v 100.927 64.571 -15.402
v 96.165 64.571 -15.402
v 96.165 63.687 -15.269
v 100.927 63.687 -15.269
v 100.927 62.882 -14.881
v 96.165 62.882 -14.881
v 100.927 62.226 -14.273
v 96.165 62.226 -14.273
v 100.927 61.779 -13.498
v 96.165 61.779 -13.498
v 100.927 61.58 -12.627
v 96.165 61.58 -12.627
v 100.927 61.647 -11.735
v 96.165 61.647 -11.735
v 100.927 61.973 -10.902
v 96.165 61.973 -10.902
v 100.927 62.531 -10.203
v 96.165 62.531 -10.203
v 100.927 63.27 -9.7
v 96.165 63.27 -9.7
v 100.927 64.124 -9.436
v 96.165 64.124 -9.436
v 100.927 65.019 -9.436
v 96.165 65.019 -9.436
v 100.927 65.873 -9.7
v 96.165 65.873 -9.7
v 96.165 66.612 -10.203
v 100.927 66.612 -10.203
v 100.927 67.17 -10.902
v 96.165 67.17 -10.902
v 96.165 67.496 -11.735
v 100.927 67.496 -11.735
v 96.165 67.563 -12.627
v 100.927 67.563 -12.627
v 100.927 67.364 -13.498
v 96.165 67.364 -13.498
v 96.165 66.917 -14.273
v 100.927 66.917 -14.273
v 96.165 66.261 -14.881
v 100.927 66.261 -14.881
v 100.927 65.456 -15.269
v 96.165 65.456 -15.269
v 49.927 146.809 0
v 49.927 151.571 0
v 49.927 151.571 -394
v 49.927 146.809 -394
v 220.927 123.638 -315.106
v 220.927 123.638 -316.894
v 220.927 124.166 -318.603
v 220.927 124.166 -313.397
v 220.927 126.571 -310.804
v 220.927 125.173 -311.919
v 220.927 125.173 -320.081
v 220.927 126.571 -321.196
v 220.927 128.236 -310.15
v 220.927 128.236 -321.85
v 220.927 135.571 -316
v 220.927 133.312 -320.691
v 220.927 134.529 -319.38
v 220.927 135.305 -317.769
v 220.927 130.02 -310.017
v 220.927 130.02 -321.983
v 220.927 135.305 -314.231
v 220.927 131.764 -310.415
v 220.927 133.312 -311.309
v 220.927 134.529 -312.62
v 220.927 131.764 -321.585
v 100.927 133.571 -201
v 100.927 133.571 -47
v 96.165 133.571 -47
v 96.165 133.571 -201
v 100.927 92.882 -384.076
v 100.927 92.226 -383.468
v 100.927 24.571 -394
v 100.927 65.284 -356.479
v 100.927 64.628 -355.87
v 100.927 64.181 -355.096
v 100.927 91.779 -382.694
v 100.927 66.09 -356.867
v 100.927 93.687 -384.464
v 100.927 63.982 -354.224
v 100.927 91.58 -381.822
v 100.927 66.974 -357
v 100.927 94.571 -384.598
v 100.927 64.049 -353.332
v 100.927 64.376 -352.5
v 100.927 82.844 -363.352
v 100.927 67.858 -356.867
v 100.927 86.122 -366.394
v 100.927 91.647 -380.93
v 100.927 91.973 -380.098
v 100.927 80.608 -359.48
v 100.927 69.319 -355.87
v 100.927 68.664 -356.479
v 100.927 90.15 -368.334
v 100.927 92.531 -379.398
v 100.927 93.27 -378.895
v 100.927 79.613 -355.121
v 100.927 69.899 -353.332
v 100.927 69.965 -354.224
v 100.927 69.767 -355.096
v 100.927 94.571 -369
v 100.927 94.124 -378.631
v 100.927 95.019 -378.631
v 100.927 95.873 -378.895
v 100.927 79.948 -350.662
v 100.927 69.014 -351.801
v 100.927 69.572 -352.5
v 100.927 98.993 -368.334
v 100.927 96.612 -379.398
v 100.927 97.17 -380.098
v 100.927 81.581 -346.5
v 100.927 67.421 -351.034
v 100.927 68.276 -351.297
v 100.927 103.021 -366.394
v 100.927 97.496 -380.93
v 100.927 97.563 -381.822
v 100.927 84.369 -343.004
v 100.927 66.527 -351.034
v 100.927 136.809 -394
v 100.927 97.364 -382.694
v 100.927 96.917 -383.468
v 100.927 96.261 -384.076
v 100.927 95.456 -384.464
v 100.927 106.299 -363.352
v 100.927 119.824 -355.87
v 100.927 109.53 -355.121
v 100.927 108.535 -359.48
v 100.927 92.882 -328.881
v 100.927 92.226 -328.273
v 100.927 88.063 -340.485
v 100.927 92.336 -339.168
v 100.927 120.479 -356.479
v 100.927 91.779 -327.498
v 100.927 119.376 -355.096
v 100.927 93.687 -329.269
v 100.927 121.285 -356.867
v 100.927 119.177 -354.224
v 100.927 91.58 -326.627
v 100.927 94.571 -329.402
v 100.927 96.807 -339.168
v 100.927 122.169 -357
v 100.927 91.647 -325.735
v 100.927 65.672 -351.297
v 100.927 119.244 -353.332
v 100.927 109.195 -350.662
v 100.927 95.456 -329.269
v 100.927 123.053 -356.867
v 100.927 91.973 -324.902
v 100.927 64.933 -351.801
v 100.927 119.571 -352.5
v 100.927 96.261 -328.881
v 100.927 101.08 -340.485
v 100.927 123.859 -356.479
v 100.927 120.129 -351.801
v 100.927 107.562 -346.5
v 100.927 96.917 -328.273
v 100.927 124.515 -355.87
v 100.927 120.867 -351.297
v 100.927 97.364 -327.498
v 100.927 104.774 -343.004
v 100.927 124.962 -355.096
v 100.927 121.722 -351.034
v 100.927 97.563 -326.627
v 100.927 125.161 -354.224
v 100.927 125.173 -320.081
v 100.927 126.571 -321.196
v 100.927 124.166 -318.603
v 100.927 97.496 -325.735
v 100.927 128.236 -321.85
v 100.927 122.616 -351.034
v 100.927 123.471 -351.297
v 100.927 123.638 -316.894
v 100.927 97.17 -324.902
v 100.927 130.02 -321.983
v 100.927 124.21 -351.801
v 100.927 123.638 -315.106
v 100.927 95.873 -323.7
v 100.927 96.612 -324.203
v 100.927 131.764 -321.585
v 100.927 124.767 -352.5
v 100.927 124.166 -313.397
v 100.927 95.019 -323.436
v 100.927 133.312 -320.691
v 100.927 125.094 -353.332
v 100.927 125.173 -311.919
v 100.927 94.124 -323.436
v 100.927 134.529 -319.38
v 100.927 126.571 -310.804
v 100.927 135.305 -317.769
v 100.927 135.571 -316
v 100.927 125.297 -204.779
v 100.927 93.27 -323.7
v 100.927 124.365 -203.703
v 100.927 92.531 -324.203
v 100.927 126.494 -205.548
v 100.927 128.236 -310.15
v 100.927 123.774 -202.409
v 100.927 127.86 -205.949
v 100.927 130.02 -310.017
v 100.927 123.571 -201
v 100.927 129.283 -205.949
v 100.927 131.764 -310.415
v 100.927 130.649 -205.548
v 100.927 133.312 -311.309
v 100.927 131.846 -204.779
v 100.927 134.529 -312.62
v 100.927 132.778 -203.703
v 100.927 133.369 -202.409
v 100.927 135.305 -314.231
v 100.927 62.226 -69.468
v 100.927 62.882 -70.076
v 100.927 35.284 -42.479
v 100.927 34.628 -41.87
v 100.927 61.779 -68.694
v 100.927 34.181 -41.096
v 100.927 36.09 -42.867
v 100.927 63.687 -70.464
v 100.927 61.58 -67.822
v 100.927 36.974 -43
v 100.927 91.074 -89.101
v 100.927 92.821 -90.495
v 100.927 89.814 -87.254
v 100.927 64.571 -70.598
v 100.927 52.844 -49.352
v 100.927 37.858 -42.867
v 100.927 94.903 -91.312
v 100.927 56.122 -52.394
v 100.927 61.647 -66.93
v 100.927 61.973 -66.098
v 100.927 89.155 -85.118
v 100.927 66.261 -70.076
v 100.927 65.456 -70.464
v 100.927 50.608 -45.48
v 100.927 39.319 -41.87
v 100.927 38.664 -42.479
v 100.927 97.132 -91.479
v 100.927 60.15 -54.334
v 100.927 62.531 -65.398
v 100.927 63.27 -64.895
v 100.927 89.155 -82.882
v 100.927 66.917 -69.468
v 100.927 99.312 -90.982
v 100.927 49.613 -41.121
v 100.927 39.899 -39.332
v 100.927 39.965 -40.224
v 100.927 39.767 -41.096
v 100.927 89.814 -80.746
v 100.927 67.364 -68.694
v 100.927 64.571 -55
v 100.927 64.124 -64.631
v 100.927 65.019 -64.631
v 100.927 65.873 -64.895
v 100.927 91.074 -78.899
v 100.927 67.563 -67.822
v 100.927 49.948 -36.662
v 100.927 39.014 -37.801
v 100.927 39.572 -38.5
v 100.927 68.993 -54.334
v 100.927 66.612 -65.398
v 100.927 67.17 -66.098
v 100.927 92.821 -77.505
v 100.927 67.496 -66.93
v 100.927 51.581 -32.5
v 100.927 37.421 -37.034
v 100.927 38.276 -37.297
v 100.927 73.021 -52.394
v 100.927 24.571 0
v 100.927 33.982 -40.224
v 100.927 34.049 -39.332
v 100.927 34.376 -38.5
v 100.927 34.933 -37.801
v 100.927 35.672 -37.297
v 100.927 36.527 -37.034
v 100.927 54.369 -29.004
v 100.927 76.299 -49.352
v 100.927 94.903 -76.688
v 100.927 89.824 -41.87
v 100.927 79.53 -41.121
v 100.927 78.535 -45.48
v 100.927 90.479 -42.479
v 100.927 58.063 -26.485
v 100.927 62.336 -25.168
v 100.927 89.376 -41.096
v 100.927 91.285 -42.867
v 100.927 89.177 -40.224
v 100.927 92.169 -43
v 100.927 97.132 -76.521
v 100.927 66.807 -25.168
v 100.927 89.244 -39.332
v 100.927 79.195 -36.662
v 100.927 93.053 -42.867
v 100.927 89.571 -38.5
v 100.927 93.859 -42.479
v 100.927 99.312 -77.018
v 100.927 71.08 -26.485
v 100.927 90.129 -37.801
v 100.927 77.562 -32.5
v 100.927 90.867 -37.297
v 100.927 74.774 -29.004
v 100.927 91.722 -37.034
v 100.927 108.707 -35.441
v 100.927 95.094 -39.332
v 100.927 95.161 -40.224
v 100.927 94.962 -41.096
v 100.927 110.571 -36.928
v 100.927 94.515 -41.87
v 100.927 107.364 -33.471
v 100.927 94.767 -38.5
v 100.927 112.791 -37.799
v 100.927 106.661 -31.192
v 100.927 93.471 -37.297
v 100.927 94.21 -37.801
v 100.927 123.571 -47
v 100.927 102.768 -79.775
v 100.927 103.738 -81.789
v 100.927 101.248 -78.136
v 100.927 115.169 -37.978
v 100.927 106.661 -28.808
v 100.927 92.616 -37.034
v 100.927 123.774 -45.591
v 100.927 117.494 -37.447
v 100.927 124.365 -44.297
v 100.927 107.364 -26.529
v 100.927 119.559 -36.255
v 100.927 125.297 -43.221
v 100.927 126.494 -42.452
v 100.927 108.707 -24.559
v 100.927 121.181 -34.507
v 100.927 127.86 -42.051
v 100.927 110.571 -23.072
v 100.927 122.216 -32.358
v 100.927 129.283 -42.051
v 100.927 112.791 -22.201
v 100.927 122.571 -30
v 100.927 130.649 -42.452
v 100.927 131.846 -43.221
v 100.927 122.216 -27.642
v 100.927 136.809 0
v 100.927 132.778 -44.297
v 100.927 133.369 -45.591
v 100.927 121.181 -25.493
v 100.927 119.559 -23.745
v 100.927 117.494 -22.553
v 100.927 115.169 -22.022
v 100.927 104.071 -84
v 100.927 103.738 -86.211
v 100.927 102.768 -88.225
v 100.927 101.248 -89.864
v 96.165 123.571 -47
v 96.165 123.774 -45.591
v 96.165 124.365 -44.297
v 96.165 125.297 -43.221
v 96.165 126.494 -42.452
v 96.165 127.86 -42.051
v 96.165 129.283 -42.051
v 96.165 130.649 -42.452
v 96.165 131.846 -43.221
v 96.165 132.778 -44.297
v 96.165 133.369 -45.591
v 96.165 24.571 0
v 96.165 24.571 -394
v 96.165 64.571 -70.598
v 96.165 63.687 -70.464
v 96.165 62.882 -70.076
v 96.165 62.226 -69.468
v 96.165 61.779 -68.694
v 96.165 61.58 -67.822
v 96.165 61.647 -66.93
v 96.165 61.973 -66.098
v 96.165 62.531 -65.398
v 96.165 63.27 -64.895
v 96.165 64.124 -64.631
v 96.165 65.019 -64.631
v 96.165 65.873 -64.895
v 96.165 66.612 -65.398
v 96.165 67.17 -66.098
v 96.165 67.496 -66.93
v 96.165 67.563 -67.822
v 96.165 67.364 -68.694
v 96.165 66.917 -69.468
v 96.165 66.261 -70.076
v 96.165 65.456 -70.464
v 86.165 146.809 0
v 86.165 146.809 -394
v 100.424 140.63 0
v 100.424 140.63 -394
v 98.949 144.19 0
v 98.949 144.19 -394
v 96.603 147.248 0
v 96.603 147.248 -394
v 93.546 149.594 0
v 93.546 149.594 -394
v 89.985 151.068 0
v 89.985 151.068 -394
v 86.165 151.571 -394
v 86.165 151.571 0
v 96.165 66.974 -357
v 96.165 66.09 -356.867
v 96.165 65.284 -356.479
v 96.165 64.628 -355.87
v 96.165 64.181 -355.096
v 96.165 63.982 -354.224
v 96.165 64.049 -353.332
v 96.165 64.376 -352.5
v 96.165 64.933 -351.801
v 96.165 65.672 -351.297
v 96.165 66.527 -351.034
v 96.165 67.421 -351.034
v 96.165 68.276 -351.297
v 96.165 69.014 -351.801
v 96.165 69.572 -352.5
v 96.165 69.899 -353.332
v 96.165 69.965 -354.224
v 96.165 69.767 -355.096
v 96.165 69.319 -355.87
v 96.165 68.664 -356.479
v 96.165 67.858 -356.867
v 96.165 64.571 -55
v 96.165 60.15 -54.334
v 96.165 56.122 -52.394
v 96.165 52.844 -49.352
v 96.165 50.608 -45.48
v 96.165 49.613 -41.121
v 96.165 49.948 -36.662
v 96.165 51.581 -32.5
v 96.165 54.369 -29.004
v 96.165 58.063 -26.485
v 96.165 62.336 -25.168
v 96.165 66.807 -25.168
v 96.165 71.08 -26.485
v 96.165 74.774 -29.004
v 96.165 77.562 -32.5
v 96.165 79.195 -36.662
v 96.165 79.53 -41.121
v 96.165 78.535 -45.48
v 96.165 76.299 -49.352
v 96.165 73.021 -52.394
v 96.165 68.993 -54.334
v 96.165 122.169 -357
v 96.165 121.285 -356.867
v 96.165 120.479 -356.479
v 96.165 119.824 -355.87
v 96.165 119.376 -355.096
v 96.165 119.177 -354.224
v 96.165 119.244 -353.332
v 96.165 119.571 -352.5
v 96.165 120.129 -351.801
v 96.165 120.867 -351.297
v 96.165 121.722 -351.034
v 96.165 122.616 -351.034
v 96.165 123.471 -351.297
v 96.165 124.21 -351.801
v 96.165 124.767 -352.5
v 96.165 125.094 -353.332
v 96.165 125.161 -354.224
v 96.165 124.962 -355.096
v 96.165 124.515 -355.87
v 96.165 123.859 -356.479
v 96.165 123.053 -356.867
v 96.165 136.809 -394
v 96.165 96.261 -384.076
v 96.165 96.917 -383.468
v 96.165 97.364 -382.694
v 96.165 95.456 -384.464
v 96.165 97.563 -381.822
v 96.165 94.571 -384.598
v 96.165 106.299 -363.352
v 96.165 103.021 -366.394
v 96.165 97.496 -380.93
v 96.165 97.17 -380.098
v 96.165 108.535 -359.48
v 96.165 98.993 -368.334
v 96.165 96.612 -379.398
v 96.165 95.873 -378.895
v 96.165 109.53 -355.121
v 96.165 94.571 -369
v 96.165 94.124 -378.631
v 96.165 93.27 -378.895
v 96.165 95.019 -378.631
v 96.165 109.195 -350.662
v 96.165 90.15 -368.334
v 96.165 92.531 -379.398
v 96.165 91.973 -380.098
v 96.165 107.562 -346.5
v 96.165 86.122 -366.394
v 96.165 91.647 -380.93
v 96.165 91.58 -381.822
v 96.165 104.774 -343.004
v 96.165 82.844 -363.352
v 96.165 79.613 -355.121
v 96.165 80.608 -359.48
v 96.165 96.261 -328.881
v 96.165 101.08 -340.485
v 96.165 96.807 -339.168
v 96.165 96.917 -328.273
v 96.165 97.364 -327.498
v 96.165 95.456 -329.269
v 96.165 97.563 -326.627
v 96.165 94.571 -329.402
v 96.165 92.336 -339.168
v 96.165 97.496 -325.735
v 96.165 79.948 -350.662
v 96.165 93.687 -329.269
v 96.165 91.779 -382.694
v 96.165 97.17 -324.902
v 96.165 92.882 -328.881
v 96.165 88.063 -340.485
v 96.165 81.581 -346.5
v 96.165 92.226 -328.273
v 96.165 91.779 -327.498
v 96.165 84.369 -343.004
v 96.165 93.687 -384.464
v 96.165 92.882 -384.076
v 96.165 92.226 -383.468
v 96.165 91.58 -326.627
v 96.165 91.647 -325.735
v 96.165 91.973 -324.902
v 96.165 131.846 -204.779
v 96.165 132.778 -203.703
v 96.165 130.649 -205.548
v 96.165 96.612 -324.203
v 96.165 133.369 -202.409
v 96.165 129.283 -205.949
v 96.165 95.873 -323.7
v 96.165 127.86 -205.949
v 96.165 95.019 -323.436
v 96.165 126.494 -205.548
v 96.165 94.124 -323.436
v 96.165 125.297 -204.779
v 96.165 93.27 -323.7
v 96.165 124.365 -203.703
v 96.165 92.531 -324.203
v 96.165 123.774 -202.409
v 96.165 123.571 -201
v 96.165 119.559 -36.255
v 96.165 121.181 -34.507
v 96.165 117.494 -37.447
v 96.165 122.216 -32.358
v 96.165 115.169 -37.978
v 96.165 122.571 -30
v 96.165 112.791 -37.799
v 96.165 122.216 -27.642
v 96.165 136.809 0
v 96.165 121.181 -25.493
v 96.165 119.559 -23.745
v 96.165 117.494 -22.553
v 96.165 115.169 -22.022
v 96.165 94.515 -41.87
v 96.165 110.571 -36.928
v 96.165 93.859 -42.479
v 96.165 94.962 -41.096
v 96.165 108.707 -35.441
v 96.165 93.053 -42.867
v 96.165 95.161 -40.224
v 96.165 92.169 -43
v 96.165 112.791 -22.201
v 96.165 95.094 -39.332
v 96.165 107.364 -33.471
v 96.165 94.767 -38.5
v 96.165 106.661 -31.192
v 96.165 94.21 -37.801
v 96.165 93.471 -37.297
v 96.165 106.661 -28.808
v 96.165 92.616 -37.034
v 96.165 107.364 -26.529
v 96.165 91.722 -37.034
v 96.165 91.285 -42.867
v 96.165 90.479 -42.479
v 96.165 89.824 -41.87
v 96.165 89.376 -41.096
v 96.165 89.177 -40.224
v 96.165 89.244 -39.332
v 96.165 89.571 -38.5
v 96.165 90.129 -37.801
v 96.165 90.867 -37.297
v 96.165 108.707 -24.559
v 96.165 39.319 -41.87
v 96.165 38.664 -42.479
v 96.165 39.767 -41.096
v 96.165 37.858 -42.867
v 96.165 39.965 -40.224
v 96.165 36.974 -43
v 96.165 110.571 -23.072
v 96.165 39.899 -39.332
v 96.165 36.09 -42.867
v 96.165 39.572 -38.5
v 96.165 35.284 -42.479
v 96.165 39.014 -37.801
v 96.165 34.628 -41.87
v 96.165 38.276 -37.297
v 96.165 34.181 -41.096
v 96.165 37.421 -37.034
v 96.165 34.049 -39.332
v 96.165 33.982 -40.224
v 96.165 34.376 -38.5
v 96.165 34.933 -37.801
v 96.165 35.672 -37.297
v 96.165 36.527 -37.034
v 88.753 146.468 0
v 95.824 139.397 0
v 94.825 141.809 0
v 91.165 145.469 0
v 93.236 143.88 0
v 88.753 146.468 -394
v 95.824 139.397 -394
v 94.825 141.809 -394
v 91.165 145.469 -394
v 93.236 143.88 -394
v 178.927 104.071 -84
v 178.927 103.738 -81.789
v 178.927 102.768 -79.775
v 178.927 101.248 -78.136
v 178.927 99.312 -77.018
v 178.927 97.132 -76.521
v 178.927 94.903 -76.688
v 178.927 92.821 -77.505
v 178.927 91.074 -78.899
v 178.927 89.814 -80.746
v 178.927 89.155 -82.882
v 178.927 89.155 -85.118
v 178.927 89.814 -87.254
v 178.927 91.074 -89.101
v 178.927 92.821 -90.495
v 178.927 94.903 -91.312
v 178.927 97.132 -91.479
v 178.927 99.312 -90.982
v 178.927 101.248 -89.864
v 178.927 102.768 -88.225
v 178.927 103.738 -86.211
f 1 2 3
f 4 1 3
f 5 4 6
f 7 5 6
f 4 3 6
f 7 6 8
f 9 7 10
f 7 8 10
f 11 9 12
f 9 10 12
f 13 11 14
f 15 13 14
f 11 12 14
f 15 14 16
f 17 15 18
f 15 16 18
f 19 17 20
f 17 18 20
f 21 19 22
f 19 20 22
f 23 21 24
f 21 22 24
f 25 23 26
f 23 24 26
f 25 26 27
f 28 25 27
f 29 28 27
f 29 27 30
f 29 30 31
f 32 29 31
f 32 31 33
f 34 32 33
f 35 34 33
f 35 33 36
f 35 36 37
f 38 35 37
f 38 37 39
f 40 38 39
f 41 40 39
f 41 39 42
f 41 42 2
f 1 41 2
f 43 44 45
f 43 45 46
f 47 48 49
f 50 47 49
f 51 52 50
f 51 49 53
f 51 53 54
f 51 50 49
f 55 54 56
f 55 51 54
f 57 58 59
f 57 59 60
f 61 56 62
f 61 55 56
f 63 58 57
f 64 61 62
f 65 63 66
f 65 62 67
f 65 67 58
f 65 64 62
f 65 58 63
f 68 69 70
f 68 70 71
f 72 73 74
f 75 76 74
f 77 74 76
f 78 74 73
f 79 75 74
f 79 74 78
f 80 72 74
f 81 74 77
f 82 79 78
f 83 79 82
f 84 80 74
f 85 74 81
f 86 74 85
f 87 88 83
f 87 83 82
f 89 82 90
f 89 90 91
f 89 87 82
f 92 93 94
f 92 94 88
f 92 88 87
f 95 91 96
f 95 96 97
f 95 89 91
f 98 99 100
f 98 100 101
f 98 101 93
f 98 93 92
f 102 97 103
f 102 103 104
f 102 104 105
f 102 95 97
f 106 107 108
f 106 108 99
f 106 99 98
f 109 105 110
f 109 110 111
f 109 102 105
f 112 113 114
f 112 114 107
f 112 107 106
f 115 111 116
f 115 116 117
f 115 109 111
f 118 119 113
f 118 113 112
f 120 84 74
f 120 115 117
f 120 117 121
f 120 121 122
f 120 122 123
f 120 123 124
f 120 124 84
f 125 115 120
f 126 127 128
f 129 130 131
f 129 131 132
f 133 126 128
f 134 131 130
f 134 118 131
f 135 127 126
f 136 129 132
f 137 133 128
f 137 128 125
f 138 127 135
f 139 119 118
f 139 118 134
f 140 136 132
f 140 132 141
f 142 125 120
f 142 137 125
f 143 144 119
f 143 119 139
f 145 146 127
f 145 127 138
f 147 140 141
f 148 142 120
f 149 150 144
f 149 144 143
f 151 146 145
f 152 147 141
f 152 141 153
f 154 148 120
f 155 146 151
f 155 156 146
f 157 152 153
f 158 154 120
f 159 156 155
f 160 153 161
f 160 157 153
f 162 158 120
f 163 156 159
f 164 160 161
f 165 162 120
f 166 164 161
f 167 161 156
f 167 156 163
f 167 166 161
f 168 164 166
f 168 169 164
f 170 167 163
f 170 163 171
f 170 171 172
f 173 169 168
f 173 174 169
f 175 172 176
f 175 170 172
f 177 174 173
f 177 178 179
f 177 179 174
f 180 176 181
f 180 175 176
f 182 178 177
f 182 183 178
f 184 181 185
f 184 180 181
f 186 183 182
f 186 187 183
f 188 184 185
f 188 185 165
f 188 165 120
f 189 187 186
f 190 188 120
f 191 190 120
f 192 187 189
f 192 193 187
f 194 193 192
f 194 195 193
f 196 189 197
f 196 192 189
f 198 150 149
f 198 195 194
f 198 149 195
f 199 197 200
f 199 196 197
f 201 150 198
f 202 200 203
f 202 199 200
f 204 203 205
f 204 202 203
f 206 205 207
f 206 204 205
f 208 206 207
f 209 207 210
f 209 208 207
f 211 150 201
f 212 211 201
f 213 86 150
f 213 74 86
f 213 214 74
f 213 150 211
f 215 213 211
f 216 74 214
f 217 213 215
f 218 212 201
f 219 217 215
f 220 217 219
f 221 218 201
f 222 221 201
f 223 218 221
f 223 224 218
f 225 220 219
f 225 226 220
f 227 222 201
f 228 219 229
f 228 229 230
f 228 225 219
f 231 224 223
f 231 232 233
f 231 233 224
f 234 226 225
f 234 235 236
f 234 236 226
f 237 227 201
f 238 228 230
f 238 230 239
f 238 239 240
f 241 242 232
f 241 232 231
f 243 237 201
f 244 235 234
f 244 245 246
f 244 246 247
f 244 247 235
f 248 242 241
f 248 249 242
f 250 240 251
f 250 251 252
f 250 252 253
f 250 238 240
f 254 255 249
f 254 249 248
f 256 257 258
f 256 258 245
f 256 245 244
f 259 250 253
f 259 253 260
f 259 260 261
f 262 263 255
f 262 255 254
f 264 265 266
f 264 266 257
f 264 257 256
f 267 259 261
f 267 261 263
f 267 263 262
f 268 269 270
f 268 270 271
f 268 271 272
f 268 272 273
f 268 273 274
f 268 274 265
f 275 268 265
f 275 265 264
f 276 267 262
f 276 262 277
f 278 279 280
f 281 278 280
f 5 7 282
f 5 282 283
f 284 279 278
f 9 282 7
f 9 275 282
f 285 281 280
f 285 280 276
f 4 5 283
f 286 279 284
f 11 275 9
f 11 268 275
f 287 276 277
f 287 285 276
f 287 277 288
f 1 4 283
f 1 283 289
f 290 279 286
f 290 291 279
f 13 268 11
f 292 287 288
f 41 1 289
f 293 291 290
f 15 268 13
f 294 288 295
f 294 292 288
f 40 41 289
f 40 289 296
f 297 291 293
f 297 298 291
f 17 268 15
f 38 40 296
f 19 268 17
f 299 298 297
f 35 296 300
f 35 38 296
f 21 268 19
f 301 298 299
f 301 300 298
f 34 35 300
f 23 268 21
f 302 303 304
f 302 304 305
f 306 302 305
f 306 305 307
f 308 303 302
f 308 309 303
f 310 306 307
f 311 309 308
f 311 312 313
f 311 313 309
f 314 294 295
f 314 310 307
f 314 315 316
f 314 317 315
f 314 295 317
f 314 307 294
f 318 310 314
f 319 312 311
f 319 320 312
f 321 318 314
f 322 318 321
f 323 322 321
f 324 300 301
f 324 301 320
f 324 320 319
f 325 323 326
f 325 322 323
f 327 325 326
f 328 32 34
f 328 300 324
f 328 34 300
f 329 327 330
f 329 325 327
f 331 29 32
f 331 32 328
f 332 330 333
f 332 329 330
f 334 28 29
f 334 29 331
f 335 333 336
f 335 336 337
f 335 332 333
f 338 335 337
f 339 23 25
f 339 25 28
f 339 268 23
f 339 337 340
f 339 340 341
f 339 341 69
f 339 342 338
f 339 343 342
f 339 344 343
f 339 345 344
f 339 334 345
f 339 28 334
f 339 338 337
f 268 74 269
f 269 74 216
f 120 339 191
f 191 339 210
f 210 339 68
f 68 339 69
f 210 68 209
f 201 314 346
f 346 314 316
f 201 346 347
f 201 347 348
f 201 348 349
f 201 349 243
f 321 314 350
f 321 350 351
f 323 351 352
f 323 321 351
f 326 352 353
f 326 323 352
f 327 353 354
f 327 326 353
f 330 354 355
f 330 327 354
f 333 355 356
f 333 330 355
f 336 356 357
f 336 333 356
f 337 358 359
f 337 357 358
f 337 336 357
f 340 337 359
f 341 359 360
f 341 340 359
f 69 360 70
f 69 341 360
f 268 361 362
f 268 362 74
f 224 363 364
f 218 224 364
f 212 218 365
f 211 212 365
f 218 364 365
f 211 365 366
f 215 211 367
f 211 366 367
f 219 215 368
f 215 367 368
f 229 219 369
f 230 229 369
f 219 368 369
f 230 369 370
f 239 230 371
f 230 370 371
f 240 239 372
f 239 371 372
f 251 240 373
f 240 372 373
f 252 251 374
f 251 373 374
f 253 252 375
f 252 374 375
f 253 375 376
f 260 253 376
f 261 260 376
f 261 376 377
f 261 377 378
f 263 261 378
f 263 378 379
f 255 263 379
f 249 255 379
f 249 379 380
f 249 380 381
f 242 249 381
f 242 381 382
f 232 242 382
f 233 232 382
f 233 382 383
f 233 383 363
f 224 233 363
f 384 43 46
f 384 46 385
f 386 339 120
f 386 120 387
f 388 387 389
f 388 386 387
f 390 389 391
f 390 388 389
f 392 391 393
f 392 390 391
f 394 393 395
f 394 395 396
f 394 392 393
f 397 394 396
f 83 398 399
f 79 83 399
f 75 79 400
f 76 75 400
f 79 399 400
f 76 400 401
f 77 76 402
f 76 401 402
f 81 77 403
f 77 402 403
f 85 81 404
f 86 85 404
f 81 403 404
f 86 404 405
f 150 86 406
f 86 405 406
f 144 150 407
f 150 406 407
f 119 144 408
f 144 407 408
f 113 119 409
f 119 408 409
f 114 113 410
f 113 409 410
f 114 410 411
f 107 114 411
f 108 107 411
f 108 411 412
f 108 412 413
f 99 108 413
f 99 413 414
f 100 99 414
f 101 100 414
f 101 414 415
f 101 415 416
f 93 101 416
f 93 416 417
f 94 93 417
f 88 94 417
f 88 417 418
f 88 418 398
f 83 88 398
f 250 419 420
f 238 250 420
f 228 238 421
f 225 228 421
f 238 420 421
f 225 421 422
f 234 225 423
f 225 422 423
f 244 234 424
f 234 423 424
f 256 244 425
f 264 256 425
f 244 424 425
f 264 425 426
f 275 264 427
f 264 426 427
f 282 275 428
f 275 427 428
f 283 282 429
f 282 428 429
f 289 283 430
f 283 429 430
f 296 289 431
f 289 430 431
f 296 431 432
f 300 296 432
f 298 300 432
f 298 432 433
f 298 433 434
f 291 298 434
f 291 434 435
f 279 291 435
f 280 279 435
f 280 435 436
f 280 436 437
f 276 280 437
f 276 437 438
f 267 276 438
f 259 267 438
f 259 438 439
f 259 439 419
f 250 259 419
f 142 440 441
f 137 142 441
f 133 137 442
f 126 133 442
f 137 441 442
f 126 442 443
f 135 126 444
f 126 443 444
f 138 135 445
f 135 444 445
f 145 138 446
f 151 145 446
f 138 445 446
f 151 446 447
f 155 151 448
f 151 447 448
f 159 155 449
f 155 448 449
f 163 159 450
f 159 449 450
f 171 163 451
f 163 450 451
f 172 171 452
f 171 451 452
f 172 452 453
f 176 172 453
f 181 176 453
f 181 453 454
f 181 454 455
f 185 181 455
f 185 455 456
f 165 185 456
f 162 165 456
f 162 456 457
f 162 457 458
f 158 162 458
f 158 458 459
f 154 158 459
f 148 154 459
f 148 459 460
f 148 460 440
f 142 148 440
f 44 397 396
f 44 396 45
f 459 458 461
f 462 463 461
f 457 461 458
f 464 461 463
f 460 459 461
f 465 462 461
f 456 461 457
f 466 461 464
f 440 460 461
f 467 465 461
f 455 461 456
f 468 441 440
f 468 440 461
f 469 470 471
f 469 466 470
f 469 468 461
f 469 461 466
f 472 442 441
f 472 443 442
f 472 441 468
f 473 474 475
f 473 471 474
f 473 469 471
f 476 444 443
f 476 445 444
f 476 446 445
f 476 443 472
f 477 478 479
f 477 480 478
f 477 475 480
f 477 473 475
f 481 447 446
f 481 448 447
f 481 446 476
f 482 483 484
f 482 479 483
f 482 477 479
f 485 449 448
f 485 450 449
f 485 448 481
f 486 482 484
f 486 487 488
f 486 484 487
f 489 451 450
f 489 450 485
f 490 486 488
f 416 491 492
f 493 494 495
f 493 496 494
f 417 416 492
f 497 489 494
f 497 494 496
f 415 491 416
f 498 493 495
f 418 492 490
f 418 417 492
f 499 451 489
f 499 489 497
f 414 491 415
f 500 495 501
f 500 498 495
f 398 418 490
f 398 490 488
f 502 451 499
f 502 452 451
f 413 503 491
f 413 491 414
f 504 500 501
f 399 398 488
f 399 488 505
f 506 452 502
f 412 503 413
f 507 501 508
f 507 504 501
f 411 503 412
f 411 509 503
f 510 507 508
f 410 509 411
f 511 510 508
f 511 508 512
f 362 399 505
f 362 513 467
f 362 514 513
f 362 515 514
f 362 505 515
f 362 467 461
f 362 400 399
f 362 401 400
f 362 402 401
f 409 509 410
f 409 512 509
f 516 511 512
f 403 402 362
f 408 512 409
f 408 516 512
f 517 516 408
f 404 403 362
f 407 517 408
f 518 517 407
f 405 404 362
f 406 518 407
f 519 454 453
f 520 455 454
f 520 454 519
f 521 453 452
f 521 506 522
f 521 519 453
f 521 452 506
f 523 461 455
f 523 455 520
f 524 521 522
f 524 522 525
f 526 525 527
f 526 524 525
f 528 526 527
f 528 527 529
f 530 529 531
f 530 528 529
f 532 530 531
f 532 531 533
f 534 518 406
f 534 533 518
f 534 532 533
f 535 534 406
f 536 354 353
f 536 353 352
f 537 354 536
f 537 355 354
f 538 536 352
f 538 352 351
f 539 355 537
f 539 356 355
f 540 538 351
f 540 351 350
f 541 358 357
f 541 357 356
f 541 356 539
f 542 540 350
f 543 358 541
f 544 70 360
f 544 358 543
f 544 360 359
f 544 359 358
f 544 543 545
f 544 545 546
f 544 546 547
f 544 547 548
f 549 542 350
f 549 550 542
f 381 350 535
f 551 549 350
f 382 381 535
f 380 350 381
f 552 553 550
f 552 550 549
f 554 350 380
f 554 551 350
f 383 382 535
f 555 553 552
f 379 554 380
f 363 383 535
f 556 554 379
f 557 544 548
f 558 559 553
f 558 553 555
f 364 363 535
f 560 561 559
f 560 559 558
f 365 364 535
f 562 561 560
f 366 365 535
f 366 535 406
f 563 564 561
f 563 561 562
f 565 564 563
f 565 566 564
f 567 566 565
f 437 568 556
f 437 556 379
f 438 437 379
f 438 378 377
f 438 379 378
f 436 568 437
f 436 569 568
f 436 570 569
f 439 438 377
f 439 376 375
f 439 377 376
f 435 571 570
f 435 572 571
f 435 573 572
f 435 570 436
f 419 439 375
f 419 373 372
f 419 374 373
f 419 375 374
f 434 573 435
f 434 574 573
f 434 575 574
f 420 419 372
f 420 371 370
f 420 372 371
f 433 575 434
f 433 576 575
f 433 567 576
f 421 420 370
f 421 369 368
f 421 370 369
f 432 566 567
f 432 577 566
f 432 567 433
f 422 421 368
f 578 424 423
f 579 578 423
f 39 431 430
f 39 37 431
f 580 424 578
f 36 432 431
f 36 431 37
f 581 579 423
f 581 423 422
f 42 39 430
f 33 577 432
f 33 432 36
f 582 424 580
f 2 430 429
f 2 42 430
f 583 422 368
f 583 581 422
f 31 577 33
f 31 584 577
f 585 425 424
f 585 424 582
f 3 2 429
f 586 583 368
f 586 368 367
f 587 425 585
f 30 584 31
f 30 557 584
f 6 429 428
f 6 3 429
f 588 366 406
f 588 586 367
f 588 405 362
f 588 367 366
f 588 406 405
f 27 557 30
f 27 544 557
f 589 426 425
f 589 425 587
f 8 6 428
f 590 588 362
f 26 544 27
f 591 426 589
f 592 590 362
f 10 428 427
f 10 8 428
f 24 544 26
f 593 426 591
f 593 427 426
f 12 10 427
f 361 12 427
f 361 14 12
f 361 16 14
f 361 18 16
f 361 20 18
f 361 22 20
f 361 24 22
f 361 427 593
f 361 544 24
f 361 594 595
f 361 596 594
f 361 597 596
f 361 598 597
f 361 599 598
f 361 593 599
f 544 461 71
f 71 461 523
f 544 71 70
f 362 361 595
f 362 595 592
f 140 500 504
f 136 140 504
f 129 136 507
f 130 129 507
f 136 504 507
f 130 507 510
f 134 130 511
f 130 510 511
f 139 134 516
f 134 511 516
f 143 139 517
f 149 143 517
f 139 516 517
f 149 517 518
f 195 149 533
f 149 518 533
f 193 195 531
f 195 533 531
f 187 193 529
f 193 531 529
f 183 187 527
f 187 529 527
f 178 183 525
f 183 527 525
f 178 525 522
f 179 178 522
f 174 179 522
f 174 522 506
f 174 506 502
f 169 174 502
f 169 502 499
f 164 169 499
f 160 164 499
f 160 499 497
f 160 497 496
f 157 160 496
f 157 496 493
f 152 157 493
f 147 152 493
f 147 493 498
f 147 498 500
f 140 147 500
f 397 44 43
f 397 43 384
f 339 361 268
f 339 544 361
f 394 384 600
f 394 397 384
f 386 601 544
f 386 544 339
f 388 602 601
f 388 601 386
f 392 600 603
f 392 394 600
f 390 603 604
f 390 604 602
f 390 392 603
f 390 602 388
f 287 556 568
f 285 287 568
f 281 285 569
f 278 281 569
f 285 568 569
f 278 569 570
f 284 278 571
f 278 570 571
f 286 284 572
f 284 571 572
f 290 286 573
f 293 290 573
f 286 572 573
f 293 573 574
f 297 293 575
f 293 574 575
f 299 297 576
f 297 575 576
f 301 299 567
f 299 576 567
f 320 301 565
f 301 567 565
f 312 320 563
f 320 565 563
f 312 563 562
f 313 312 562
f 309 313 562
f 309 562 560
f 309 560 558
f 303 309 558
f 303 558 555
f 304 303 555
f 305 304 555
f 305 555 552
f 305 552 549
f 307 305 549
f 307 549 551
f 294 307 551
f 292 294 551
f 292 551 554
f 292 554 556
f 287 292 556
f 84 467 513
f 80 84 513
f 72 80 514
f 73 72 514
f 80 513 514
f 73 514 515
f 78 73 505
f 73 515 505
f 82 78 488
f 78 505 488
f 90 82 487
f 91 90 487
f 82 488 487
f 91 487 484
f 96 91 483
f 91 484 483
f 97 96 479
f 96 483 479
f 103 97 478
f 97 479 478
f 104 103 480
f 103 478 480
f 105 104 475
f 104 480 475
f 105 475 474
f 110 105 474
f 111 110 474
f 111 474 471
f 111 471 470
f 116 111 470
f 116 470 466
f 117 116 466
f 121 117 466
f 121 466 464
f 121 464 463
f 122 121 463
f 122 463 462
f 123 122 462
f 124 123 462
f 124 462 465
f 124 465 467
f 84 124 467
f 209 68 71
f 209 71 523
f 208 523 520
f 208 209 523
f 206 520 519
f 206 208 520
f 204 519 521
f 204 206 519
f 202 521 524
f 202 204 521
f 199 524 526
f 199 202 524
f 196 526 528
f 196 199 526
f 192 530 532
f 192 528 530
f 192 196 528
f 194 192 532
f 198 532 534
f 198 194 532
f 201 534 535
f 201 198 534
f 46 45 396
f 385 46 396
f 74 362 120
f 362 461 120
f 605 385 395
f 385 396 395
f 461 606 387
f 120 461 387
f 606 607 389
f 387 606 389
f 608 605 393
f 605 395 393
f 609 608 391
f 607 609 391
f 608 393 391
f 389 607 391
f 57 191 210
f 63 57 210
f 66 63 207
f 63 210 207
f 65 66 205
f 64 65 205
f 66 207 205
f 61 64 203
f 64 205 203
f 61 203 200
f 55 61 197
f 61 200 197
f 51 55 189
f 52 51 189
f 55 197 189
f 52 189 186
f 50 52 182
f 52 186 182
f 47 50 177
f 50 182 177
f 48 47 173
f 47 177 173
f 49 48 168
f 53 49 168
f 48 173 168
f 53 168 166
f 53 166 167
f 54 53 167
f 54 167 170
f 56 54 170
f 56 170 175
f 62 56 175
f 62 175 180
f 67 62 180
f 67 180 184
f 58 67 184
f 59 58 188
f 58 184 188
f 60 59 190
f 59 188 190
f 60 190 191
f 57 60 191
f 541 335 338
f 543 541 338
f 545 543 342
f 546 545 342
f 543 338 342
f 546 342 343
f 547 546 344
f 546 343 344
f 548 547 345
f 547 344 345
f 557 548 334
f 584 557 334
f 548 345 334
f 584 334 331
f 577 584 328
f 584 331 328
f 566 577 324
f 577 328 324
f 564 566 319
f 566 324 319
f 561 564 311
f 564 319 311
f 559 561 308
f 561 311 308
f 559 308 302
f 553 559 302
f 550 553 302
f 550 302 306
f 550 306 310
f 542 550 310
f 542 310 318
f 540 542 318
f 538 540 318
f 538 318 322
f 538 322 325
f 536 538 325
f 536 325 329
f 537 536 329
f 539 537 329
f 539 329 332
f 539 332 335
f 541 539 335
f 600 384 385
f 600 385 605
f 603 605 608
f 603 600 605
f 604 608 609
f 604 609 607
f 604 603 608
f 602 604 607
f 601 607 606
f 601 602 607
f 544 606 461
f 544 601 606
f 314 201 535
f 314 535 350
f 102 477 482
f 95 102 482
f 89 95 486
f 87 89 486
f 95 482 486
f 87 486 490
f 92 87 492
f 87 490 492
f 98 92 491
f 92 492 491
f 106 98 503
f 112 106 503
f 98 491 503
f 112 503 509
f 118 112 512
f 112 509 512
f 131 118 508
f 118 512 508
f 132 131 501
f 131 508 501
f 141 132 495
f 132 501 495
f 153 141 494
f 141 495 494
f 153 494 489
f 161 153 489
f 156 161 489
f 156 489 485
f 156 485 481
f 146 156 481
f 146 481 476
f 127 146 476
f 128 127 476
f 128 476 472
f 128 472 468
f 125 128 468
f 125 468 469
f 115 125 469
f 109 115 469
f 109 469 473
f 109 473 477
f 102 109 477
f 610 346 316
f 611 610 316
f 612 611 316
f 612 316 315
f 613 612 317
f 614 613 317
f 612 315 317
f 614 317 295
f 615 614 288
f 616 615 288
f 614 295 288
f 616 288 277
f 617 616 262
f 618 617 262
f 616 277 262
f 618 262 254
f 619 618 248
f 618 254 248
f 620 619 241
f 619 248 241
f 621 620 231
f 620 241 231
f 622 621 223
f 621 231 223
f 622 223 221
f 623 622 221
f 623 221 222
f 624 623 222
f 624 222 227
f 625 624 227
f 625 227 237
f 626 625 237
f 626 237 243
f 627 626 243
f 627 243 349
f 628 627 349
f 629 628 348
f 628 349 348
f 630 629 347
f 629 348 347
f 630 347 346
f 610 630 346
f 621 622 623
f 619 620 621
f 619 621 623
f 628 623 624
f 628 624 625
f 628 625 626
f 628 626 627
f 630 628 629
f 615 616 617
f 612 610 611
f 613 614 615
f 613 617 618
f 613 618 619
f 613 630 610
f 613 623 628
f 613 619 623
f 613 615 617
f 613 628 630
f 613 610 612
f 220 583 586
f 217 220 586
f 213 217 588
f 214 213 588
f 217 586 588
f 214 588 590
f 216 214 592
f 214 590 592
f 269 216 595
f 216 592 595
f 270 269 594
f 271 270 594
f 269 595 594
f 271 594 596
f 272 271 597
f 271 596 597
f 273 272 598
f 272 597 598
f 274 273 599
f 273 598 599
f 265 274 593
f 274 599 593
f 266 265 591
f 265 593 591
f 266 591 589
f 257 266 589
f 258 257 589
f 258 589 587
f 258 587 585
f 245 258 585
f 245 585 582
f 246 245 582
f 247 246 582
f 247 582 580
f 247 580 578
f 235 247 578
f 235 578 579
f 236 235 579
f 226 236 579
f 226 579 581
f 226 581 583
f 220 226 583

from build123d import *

# Parameters (mm, degrees)
SALIENTE_EXTRUIR1_DEPTH = 394
CROQUIS2_R              = 3
CROQUIS2_R_2            = 15
CORTAR_EXTRUIR1_DEPTH   = 425.673777624
CROQUIS4_R              = 8
CORTAR_EXTRUIR3_DEPTH   = 426.218662567
CROQUIS5_R              = 7.5
SALIENTE_EXTRUIR2_DEPTH = 78
CROQUIS6_R              = 6
SALIENTE_EXTRUIR3_DEPTH = 120
CORTAR_EXTRUIR4_DEPTH   = 439.873456699


with BuildPart() as part:
    # Croquis1 → Saliente-Extruir1 (new body)
    with BuildSketch(Plane.XY):
        with BuildLine():
            Line((96.164660939, 24.571471574), (100.927160939, 24.571471574))
            Line((100.927160939, 24.571471574), (100.927160939, 136.808971574))
            ThreePointArc((100.927160939, 136.808971574), (96.603324796, 147.247635431), (86.164660939, 151.571471574))
            Line((86.164660939, 151.571471574), (49.927160939, 151.571471574))
            Line((49.927160939, 151.571471574), (49.927160939, 146.808971574))
            Line((49.927160939, 146.808971574), (86.164660939, 146.808971574))
            ThreePointArc((86.164660939, 146.808971574), (93.235728751, 143.880039386), (96.164660939, 136.808971574))
            Line((96.164660939, 136.808971574), (96.164660939, 24.571471574))
        make_face()
    extrude(amount=-SALIENTE_EXTRUIR1_DEPTH)

    # Croquis2 → Cortar-Extruir1 (cut, through all)
    with BuildSketch(Plane.ZY.offset(-96.164660939)):
        with Locations(Location((-40, 36.973884985, 0), (0, 0, 180))):
            Circle(CROQUIS2_R)
        with Locations(Location((-12.402413411, 64.571471574, 0), (0, 0, 180))):
            Circle(CROQUIS2_R)
        with Locations(Location((-67.597586589, 64.571471574, 0), (0, 0, 180))):
            Circle(CROQUIS2_R)
        with Locations(Location((-40, 92.169058163, 0), (0, 0, 180))):
            Circle(CROQUIS2_R)
        with Locations(Location((-40, 64.571471574, 0), (0, 0, 180))):
            Circle(CROQUIS2_R_2)
        with Locations(Location((-326.402413411, 94.571471574, 0), (0, 0, 180))):
            Circle(CROQUIS2_R)
        with Locations(Location((-354, 66.973884985, 0), (0, 0, 180))):
            Circle(CROQUIS2_R)
        with Locations(Location((-354, 94.571471574, 0), (0, 0, 180))):
            Circle(CROQUIS2_R_2)
        with Locations(Location((-381.597586589, 94.571471574, 0), (0, 0, 180))):
            Circle(CROQUIS2_R)
        with Locations(Location((-354, 122.169058163, 0), (0, 0, 180))):
            Circle(CROQUIS2_R)
    extrude(amount=-CORTAR_EXTRUIR1_DEPTH, mode=Mode.SUBTRACT)

    # Croquis4 → Cortar-Extruir3 (cut, through all)
    with BuildSketch(Plane(origin=(100.927160939, 0, 0), x_dir=(0, 0, -1), z_dir=(1, 0, 0))):
        with Locations(Location((30, 114.571471574, 0), (0, 0, 90))):
            Circle(CROQUIS4_R)
    extrude(amount=-CORTAR_EXTRUIR3_DEPTH, mode=Mode.SUBTRACT)

    # Croquis5 → Saliente-Extruir2 (add)
    with BuildSketch(Plane(origin=(100.927160939, 0, 0), x_dir=(0, 0, -1), z_dir=(1, 0, 0))):
        with Locations(Location((84, 96.571471574, 0), (0, 0, 90))):
            Circle(CROQUIS5_R)
    extrude(amount=SALIENTE_EXTRUIR2_DEPTH)

    # Croquis6 → Saliente-Extruir3 (add)
    with BuildSketch(Plane(origin=(100.927160939, 0, 0), x_dir=(0, 0, -1), z_dir=(1, 0, 0))):
        with Locations(Location((316, 129.571471574, 0), (0, 0, 90))):
            Circle(CROQUIS6_R)
    extrude(amount=SALIENTE_EXTRUIR3_DEPTH)

    # Croquis7 → Cortar-Extruir4 (cut, through all)
    with BuildSketch(Plane(origin=(100.927160939, 0, 0), x_dir=(0, 0, -1), z_dir=(1, 0, 0))):
        with BuildLine():
            Line((47, 133.571471574), (201, 133.571471574))
            ThreePointArc((201, 133.571471574), (206, 128.571471574), (201, 123.571471574))
            Line((201, 123.571471574), (47, 123.571471574))
            ThreePointArc((47, 123.571471574), (42, 128.571471574), (47, 133.571471574))
        make_face()
    extrude(amount=-CORTAR_EXTRUIR4_DEPTH, mode=Mode.SUBTRACT)


solid = part.part
